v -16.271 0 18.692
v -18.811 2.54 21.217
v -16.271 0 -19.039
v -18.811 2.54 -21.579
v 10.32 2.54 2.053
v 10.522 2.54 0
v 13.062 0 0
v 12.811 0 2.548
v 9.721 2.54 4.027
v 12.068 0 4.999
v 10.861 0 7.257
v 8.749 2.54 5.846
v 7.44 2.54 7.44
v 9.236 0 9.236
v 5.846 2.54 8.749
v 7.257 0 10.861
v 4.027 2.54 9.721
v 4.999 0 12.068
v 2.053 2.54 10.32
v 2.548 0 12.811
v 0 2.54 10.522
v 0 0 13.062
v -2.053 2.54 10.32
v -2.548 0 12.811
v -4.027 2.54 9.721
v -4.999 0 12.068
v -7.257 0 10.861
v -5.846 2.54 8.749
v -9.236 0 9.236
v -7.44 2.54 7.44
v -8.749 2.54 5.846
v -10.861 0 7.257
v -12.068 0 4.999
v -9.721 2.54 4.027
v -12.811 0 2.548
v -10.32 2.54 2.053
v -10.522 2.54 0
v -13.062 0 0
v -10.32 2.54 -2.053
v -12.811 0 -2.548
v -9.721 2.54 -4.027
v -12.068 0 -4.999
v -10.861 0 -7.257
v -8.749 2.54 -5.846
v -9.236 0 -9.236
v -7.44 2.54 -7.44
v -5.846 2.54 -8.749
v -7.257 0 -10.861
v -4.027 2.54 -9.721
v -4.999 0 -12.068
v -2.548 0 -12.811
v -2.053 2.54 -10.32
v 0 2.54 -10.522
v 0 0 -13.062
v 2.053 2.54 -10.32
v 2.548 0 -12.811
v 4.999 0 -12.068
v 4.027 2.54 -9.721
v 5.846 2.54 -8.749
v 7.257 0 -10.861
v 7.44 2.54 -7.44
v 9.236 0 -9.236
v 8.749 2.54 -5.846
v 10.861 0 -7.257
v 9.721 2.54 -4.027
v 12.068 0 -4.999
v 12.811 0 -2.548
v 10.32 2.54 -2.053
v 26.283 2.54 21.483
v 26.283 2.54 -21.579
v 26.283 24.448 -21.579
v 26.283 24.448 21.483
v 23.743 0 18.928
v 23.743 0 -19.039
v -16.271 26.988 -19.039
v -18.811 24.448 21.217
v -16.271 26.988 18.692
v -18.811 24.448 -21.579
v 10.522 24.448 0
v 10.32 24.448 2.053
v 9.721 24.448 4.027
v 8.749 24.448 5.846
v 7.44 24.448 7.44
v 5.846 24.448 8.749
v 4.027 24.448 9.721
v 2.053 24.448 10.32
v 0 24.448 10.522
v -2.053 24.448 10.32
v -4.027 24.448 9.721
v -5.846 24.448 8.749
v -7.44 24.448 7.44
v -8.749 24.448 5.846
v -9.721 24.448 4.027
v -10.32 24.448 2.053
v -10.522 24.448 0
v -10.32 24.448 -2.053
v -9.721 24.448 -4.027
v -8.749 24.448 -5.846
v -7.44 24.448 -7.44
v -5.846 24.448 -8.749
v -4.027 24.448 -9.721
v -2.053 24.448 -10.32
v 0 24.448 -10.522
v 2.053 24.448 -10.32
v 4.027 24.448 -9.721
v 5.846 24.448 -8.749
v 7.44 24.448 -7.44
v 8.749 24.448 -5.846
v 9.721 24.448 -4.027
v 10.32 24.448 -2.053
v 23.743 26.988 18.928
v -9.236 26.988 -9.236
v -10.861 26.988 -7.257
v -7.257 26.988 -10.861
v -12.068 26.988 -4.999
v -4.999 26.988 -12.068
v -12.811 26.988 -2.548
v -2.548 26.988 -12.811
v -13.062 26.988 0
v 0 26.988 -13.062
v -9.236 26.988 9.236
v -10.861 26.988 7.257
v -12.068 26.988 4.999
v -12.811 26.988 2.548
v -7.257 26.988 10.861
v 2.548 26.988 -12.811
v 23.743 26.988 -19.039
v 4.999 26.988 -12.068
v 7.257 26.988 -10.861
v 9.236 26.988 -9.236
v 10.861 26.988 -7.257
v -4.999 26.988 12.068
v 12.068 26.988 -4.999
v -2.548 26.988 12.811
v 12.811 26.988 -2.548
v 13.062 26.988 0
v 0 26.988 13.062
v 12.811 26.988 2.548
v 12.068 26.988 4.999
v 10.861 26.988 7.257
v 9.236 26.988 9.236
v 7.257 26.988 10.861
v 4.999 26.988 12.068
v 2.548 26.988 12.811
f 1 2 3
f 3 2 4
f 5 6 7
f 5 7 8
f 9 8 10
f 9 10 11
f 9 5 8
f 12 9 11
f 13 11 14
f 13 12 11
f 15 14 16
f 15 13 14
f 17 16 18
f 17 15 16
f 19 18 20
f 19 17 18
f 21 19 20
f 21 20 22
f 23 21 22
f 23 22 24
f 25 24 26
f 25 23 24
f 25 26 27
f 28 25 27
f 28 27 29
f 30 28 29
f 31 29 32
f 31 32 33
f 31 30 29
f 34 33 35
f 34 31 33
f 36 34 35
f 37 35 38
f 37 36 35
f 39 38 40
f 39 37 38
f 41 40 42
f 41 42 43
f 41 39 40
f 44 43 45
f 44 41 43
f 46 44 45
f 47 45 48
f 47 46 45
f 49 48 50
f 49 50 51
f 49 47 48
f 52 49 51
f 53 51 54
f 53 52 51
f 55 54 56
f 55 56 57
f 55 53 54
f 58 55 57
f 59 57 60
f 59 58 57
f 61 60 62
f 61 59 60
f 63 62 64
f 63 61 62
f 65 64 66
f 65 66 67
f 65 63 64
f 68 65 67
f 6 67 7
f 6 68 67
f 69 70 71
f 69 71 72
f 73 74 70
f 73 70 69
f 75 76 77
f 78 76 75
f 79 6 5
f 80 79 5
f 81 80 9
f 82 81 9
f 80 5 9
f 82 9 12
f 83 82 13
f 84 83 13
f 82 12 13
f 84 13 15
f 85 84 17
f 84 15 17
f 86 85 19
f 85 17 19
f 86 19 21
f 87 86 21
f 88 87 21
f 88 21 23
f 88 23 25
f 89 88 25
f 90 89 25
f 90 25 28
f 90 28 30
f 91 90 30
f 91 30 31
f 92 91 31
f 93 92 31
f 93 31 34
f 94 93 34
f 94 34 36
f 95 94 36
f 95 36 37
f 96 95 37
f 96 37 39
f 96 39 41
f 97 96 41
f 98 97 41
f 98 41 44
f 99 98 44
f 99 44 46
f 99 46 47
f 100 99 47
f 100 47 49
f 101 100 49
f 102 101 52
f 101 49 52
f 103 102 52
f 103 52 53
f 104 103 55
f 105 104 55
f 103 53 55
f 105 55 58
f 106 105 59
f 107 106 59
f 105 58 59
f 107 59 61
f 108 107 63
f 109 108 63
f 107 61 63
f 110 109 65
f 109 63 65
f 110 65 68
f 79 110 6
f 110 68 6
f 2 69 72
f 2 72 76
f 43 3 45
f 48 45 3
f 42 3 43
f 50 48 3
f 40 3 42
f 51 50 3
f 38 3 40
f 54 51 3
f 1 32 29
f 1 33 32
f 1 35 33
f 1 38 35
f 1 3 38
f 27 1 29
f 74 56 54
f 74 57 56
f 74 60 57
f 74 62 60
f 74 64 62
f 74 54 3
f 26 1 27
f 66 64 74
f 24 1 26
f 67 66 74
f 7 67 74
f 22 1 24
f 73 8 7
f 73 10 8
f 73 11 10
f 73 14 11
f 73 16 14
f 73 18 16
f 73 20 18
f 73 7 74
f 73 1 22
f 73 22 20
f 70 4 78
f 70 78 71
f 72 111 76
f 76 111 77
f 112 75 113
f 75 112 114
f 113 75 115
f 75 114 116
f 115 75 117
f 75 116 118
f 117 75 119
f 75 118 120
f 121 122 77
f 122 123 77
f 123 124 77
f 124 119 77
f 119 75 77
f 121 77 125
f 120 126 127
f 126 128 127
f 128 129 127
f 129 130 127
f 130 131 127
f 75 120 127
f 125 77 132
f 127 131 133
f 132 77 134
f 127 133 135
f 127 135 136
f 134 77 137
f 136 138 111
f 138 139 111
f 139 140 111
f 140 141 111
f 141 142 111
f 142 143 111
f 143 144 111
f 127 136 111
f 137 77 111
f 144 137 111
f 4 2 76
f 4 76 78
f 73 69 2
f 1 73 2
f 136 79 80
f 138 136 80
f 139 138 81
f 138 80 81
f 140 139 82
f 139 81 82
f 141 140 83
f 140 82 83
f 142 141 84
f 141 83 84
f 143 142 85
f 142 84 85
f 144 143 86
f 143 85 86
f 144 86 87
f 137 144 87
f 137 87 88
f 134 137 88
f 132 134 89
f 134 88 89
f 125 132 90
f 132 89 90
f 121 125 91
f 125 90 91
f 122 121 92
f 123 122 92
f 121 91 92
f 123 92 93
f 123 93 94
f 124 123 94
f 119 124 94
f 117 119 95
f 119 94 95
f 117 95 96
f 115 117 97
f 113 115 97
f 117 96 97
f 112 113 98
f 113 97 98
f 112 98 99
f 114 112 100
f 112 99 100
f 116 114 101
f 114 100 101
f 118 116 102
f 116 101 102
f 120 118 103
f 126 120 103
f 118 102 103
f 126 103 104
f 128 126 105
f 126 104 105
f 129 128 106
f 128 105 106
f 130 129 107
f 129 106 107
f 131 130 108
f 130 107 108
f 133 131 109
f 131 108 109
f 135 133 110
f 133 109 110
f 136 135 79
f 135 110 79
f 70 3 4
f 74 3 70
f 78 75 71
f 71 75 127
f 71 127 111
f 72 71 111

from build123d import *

# Parameters (mm, degrees)
F1_DEPTH = 26.9878935069
F2_R     = 10.5222192306
F3_DEPTH = 26.9888935069
F4_SIZE  = 2.54
F5_SIZE  = 2.54


with BuildPart() as f1:
    # F0 (on Front) → F1 (new body)
    with BuildSketch(Plane.XZ):
        Polygon((26.283480227, -21.57907933), (26.283480227, 21.4828625321), (-18.810749054, 21.2165787816), (-18.810749054, -21.57907933), align=None)
    extrude(amount=-F1_DEPTH)

    # F2 (on face) → F3 (cut, through all)
    with BuildSketch(Plane.XZ):
        Circle(F2_R)
    extrude(amount=-F3_DEPTH, mode=Mode.SUBTRACT)

    # F4
    f4_edges = [f1.edges().sort_by_distance(p)[0] for p in [
        (26.28348, 26.987894, -0.048108),
        (3.736366, 26.987894, -21.579079),
        (3.736366, 26.987894, 21.349721),
        (-18.810749, 26.987894, -0.18125),
        (-10.522219, 26.987894, 0),
    ]]
    chamfer(f4_edges, length=F4_SIZE)

    # F5
    f5_edges = [f1.edges().sort_by_distance(p)[0] for p in [
        (26.28348, 0, -0.048108),
        (3.736366, 0, -21.579079),
        (3.736366, 0, 21.349721),
        (-18.810749, 0, -0.18125),
        (-10.522219, 0, 0),
    ]]
    chamfer(f5_edges, length=F5_SIZE)


solid = f1.part
